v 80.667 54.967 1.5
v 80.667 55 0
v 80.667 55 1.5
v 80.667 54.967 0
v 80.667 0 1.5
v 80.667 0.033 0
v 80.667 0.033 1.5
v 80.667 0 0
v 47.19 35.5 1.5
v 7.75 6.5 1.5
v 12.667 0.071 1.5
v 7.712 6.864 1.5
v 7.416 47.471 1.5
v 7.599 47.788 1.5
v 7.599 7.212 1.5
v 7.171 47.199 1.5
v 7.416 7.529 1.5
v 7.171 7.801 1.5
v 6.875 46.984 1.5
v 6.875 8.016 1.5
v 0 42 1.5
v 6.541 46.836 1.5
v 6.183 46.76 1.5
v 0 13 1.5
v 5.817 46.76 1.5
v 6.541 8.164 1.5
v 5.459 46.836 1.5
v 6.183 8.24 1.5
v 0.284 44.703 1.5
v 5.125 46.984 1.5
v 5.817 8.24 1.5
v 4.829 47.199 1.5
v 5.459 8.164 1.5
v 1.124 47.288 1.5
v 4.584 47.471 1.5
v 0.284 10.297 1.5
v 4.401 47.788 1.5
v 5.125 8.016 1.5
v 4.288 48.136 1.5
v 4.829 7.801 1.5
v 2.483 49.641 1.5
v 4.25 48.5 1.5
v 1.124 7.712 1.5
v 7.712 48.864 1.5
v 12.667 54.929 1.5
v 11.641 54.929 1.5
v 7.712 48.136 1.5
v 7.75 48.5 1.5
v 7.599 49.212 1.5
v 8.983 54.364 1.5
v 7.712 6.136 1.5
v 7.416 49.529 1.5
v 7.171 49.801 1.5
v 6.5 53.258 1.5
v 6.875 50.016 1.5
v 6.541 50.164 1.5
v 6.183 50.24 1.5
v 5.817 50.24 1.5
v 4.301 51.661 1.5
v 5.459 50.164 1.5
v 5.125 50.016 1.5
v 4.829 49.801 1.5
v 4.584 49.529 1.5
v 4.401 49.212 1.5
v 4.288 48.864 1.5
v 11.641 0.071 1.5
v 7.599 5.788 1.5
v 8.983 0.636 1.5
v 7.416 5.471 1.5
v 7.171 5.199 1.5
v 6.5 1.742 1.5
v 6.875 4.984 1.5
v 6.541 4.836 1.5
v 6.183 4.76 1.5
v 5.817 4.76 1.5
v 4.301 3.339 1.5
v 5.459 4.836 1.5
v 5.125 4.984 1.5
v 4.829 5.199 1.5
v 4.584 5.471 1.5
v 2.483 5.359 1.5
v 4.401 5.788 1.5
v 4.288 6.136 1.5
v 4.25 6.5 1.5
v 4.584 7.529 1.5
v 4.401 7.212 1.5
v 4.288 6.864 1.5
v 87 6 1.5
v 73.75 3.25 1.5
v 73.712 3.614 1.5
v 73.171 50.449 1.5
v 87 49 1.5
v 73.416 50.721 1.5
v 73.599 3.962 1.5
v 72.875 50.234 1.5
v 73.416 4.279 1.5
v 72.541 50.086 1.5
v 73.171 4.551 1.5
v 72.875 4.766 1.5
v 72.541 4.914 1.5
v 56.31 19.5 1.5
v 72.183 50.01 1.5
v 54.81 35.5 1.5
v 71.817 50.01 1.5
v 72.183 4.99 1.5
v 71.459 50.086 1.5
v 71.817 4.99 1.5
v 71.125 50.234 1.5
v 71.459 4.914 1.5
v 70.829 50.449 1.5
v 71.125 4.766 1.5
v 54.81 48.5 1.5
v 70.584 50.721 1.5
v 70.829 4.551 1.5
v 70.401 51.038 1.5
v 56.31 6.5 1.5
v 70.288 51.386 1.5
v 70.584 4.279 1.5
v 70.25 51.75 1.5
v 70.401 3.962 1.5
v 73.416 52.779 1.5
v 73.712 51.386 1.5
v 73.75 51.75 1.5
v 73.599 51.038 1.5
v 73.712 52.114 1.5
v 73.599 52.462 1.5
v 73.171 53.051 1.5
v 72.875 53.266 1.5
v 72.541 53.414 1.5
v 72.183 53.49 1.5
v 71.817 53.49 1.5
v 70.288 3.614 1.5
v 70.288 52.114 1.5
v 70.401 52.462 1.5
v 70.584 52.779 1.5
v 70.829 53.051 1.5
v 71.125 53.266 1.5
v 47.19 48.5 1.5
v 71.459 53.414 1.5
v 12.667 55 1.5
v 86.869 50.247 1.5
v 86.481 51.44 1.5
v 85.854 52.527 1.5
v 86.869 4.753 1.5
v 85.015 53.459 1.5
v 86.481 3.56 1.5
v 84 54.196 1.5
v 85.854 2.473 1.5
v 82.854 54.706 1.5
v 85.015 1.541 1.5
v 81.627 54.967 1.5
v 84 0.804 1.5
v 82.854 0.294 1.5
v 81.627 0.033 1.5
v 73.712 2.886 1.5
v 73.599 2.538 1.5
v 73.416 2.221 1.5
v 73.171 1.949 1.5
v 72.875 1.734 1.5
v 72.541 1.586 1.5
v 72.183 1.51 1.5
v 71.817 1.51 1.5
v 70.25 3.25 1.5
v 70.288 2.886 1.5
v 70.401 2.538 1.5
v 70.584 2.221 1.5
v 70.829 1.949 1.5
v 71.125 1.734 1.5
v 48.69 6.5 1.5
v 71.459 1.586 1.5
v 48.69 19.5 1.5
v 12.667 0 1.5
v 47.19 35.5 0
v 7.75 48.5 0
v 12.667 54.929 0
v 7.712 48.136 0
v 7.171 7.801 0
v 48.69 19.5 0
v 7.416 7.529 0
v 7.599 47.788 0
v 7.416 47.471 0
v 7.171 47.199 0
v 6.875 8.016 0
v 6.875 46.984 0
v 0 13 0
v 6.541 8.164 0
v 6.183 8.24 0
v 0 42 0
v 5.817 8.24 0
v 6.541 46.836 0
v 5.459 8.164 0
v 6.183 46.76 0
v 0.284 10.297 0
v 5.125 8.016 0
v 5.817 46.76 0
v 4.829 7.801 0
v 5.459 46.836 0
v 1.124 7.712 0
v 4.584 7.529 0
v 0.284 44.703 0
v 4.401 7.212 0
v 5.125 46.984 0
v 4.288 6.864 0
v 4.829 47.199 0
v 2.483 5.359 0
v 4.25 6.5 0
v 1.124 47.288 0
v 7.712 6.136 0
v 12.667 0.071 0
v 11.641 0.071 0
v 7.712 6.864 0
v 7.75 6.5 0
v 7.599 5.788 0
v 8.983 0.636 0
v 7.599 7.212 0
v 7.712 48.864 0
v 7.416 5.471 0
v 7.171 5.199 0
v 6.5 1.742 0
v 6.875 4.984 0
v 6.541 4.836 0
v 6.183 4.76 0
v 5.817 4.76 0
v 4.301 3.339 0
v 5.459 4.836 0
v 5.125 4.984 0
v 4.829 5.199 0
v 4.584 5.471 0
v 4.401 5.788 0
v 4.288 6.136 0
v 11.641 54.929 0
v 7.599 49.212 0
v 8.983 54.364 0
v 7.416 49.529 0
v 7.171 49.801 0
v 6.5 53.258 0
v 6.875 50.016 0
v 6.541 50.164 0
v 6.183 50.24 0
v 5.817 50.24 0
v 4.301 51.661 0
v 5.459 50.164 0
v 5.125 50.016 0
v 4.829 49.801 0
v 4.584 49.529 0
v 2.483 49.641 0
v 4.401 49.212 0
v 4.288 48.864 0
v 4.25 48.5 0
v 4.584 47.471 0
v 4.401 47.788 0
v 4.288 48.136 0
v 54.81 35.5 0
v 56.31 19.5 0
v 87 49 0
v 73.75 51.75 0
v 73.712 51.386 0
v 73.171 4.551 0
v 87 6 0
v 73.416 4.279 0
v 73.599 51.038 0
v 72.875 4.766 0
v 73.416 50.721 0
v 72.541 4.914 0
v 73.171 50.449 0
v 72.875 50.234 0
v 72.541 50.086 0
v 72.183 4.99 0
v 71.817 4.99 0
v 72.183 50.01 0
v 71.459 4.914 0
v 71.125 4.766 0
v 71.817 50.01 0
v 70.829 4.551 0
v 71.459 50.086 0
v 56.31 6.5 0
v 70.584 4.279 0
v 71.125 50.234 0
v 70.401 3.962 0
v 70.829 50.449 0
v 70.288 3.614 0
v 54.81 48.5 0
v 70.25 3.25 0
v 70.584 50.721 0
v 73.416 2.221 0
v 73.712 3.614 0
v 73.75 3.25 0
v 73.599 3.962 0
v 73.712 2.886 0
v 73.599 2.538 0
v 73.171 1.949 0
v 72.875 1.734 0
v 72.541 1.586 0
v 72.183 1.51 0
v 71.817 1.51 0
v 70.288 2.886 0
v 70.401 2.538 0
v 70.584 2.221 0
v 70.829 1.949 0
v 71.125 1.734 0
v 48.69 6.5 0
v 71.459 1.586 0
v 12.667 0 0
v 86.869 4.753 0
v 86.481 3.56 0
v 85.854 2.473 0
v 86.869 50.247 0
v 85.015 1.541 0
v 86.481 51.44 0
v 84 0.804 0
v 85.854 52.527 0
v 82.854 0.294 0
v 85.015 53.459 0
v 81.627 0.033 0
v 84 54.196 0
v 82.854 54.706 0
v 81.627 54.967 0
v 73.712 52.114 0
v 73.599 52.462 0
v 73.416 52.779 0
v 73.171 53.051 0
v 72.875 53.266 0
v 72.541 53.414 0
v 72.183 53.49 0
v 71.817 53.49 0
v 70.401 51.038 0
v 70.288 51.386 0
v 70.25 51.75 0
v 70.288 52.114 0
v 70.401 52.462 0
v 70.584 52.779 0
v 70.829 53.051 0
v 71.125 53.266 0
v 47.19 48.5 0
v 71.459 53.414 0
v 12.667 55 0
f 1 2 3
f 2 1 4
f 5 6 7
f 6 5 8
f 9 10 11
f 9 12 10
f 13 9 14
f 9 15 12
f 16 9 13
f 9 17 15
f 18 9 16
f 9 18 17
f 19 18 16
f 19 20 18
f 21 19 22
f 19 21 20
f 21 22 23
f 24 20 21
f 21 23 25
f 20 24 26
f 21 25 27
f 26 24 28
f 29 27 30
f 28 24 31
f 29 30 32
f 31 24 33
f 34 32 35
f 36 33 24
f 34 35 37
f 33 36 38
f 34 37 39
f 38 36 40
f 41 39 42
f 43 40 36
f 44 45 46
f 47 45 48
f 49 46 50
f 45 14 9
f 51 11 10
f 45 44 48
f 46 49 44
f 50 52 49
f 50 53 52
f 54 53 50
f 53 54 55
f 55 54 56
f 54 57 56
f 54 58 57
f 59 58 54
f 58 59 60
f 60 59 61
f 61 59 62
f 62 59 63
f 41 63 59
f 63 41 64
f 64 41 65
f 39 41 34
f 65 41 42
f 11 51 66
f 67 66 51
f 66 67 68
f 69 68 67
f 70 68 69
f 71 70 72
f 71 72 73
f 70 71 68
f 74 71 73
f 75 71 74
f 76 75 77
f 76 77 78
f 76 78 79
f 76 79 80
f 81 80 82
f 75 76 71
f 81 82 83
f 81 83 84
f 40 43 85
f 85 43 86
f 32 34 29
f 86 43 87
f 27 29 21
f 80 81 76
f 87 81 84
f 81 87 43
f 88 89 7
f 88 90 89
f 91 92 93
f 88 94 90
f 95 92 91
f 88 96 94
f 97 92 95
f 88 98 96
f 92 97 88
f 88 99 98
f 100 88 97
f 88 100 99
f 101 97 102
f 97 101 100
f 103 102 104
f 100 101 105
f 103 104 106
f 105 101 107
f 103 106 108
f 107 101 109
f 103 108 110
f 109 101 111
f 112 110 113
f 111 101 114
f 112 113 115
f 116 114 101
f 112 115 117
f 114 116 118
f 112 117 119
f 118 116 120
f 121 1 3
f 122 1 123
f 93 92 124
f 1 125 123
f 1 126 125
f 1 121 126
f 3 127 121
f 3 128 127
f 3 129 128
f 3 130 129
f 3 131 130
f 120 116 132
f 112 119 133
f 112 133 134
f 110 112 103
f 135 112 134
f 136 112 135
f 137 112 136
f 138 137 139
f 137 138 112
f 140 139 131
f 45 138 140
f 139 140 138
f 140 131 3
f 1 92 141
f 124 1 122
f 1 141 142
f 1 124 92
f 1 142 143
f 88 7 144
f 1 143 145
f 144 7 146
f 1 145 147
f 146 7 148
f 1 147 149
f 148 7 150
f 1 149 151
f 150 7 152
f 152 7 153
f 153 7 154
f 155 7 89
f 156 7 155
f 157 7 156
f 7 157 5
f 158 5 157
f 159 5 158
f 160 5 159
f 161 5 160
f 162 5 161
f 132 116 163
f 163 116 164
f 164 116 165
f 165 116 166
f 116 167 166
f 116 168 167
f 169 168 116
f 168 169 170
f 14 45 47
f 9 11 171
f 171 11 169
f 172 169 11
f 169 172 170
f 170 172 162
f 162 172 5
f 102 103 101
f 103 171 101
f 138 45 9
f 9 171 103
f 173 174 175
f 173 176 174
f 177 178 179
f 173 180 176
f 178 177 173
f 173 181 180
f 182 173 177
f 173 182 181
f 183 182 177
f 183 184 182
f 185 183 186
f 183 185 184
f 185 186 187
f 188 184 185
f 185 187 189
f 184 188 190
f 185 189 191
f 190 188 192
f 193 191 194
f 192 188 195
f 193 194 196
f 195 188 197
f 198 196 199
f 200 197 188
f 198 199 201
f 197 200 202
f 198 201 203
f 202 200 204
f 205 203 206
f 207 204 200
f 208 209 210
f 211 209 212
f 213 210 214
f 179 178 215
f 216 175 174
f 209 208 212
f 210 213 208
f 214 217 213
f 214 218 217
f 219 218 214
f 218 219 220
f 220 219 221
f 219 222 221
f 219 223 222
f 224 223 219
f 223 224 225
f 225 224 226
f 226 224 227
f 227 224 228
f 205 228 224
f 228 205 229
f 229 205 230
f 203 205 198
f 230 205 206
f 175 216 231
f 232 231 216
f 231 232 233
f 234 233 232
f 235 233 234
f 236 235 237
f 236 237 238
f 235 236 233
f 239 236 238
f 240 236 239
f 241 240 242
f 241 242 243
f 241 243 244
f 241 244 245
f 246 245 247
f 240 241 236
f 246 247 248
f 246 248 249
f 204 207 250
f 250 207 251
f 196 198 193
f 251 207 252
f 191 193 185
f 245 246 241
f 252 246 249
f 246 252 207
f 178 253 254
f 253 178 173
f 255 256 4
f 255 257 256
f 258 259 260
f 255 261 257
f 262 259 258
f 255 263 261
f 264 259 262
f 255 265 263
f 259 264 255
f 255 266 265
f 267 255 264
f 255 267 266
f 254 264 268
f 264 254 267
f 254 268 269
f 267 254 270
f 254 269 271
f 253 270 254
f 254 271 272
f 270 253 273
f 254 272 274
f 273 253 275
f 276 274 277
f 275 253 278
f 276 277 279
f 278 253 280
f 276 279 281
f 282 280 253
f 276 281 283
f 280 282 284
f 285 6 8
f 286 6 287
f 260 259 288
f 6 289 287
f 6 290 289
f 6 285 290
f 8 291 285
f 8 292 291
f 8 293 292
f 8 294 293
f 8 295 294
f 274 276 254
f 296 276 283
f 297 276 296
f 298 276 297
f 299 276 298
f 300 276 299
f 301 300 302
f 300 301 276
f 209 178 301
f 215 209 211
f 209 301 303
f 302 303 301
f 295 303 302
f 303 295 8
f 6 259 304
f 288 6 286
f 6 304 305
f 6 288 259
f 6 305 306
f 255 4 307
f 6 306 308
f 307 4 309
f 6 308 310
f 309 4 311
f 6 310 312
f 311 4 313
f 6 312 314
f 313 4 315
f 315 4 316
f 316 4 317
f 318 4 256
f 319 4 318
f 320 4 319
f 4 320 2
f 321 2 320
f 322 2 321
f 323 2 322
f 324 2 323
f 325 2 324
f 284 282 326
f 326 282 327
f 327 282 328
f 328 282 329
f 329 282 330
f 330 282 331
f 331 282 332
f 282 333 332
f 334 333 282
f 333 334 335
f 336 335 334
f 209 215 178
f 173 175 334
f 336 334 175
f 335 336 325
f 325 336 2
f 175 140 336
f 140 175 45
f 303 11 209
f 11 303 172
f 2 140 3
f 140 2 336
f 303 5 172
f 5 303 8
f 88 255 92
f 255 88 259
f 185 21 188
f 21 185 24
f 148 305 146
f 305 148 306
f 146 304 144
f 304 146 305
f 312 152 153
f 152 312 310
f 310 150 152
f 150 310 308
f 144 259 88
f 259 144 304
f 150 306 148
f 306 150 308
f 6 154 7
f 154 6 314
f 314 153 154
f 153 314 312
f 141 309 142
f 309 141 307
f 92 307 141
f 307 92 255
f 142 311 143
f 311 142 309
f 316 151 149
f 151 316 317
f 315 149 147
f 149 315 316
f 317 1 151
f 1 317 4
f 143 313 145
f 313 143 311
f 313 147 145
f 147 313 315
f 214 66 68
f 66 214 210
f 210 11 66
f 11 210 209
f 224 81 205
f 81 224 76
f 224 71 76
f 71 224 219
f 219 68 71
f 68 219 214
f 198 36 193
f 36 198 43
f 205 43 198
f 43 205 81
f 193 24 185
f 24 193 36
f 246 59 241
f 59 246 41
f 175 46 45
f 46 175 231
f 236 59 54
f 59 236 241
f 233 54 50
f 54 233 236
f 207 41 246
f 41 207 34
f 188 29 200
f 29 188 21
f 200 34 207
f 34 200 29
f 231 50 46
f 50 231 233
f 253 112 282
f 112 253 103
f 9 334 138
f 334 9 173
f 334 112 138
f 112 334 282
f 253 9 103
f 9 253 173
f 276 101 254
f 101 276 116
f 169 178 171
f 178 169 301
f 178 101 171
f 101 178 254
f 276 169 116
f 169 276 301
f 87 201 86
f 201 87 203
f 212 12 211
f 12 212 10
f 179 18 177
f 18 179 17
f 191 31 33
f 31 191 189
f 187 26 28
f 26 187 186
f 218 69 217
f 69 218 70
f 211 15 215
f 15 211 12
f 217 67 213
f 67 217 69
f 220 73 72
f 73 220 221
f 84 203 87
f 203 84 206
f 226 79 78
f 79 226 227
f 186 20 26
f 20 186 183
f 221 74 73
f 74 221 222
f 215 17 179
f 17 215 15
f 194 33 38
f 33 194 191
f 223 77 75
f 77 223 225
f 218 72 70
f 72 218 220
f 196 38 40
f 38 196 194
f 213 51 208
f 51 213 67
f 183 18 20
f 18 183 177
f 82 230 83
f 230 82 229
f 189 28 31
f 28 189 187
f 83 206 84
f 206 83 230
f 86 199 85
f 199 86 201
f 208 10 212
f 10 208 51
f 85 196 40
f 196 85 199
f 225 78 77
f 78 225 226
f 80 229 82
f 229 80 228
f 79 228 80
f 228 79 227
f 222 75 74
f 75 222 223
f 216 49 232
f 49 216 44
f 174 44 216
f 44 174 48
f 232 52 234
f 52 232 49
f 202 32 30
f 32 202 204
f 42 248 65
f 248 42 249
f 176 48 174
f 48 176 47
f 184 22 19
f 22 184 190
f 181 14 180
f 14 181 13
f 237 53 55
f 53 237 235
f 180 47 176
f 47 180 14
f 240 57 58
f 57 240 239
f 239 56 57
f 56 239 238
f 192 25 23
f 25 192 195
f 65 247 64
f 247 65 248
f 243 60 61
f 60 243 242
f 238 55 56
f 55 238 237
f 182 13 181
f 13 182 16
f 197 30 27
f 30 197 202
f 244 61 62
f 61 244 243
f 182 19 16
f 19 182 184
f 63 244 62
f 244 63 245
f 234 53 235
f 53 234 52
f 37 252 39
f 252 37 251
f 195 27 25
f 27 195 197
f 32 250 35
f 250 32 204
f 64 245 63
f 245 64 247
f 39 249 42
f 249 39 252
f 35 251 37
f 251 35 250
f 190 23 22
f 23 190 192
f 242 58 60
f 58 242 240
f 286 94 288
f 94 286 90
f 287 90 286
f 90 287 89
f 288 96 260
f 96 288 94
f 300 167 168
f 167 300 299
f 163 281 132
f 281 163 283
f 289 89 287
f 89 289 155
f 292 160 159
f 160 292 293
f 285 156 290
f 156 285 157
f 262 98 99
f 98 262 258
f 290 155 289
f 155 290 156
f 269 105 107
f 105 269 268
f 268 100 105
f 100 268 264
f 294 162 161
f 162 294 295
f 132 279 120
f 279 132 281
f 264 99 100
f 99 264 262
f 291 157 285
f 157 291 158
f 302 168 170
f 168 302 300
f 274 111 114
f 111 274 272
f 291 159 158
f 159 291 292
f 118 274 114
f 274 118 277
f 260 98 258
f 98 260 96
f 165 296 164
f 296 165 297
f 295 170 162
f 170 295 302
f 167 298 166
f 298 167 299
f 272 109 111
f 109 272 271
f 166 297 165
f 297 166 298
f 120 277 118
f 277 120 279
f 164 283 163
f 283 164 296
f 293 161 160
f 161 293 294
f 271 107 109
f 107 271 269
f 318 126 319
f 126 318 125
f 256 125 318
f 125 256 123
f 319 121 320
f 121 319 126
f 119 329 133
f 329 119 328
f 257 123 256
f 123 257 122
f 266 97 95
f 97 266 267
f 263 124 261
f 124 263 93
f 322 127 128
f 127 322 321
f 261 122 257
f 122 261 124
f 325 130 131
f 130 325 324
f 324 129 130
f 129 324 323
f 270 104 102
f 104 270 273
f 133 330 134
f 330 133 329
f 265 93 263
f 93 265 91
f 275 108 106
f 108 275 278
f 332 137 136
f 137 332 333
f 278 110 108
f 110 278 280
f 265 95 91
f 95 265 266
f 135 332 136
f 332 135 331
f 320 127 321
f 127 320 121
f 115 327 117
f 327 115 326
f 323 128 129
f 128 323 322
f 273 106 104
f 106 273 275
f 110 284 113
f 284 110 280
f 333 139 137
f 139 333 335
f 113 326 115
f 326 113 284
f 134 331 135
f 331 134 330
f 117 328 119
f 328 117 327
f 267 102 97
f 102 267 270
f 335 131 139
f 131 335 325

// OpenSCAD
$fn=30;
_h=1.5;_y=55.0;_x=87.0;
difference(){
    union(){
        _r1=6; _r2=13;
        translate([(_r1+_r2)*2/3,0,0])cube([_x-(_r1+_r2),_y,_h]);
        translate([_r2,_r1,0])cube([_x-_r2,_y-(_r1*2),_h]);
        translate([0,_r2,0])cube([_x-_r1*2,_y-_r2*2,_h]);

        translate([_x-_r1,_r1,0])cylinder(r=_r1, h=_h);
        translate([_x-_r1,_y-_r1,0])cylinder(r=_r1, h=_h);
        translate([_r2,_r2,0])cylinder(r=_r2, h=_h);
        translate([_r2,_y-_r2,0])cylinder(r=_r2, h=_h);
    }
    
    translate([_x-36.0,_y-13.0,_h/2])
        cube([7.62,13,_h+1],center=true);
    
    translate([_x-(36.0-1.5),13.0,_h/2])
        cube([7.62,13,_h+1],center=true);
    
    x1=6;y1=6.5;y2=_y-y1;
    x2=_x-15;y3=3.25;y4=_y-y3;
    translate([x1,y1,0])cylinder(r=1.75,h=5);
    translate([x1,y2,0])cylinder(r=1.75,h=5);
    translate([x2,y3,0])cylinder(r=1.75,h=5);
    translate([x2,y4,0])cylinder(r=1.75,h=5);

}
